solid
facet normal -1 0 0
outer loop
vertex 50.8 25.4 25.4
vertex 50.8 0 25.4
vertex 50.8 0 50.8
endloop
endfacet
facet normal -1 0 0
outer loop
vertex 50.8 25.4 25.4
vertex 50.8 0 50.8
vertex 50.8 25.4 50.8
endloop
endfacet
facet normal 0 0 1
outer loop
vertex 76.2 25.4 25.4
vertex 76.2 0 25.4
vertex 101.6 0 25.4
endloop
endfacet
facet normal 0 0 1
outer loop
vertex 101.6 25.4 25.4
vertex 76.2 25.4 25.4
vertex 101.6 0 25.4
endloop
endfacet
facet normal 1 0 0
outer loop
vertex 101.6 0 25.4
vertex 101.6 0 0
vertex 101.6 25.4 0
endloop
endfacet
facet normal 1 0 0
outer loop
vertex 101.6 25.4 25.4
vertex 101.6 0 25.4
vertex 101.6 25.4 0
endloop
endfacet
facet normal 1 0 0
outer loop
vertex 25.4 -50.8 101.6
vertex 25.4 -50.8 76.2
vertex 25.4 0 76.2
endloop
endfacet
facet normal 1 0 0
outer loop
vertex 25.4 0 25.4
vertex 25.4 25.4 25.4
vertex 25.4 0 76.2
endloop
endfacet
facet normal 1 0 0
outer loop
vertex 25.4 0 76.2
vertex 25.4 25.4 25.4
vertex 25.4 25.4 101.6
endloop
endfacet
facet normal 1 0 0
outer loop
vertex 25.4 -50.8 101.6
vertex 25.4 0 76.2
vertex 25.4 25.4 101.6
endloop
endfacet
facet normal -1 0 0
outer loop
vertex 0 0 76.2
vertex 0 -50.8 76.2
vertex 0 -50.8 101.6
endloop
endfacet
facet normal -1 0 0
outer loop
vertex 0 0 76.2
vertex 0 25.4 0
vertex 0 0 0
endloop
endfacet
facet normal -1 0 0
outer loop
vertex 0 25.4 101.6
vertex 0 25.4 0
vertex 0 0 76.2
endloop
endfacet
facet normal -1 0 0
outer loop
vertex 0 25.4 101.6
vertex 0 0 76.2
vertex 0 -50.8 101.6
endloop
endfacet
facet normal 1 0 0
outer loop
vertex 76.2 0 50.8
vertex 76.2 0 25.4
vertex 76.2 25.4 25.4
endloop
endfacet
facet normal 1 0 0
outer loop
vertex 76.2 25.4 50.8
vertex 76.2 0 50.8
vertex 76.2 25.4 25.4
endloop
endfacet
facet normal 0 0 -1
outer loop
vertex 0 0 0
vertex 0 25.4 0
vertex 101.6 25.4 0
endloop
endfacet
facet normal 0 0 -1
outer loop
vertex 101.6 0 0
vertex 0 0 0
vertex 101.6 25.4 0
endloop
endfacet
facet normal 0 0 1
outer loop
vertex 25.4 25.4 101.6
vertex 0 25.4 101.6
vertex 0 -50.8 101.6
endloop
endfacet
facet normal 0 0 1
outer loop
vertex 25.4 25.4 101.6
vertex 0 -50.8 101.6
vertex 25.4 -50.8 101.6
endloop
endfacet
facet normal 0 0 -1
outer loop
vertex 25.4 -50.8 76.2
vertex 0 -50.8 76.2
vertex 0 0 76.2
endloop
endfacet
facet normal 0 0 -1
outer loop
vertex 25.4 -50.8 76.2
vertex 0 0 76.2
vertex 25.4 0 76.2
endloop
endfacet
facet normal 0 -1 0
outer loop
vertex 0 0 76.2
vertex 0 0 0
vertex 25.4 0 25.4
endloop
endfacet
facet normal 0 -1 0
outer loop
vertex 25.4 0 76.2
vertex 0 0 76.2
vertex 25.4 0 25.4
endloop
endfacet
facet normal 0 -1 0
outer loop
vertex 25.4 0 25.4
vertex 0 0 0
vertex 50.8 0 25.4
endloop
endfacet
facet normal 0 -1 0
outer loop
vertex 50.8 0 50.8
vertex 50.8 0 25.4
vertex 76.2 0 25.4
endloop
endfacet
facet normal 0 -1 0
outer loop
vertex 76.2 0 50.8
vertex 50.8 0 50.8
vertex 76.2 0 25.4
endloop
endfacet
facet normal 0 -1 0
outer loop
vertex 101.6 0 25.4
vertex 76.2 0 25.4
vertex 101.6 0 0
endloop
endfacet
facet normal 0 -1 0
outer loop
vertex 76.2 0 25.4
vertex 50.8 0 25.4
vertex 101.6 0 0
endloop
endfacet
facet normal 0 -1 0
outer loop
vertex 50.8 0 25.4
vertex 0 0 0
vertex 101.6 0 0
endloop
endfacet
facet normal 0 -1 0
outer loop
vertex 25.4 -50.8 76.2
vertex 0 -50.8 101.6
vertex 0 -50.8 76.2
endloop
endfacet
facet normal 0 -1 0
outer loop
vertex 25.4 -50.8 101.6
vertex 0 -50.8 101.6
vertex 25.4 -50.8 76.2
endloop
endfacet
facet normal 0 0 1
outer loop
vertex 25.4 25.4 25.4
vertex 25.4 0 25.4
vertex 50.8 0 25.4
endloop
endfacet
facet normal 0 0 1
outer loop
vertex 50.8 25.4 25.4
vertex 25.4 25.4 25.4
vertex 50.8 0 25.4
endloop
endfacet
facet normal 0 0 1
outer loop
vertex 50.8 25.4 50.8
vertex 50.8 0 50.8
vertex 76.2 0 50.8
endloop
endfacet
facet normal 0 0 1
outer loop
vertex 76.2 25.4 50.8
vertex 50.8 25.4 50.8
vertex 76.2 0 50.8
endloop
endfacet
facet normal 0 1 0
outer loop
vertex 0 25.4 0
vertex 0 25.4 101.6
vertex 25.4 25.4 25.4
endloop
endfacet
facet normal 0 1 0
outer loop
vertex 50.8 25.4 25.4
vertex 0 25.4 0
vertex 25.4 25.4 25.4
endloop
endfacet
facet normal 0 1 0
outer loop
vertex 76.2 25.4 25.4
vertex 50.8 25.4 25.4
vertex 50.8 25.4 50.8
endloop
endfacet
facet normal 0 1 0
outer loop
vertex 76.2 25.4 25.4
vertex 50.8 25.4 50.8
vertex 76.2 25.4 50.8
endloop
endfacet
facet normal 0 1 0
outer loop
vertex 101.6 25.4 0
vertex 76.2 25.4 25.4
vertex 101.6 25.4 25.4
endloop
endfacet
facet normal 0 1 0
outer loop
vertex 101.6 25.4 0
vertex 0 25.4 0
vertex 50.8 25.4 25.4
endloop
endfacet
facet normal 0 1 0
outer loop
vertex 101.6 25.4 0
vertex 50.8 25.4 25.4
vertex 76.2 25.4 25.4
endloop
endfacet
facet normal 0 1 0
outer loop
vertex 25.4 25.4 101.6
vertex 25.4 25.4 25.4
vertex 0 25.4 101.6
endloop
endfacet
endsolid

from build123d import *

# Parameters (mm, degrees)
F0_W     = 25.4
F0_H     = 25.4
F1_DEPTH = 25.4
F2_DEPTH = 50.8
F3_DEPTH = 101.6
F4_W     = 25.4
F4_H     = 25.4
F5_DEPTH = 50.8


with BuildPart() as f1:
    # F0 (on Top) → F1 (new body)
    with BuildSketch(Plane.XY):
        with Locations((38.1, 12.7)):
            Rectangle(F0_W, F0_H)
        with Locations((88.9, 12.7)):
            Rectangle(F0_W, F0_H)
    extrude(amount=F1_DEPTH)

    # F0 (on Top) → F2 (join)
    with BuildSketch(Plane.XY):
        with Locations((63.5, 12.7)):
            Rectangle(F0_W, F0_H)
    extrude(amount=F2_DEPTH)

    # F0 (on Top) → F3 (join)
    with BuildSketch(Plane.XY):
        with Locations((12.7, 12.7)):
            Rectangle(F0_W, F0_H)
    extrude(amount=F3_DEPTH)

    # F4 (on face) → F5 (join)
    with BuildSketch(Plane.XZ):
        with Locations((12.7, 88.9)):
            Rectangle(F4_W, F4_H)
    extrude(amount=F5_DEPTH)


solid = f1.part
